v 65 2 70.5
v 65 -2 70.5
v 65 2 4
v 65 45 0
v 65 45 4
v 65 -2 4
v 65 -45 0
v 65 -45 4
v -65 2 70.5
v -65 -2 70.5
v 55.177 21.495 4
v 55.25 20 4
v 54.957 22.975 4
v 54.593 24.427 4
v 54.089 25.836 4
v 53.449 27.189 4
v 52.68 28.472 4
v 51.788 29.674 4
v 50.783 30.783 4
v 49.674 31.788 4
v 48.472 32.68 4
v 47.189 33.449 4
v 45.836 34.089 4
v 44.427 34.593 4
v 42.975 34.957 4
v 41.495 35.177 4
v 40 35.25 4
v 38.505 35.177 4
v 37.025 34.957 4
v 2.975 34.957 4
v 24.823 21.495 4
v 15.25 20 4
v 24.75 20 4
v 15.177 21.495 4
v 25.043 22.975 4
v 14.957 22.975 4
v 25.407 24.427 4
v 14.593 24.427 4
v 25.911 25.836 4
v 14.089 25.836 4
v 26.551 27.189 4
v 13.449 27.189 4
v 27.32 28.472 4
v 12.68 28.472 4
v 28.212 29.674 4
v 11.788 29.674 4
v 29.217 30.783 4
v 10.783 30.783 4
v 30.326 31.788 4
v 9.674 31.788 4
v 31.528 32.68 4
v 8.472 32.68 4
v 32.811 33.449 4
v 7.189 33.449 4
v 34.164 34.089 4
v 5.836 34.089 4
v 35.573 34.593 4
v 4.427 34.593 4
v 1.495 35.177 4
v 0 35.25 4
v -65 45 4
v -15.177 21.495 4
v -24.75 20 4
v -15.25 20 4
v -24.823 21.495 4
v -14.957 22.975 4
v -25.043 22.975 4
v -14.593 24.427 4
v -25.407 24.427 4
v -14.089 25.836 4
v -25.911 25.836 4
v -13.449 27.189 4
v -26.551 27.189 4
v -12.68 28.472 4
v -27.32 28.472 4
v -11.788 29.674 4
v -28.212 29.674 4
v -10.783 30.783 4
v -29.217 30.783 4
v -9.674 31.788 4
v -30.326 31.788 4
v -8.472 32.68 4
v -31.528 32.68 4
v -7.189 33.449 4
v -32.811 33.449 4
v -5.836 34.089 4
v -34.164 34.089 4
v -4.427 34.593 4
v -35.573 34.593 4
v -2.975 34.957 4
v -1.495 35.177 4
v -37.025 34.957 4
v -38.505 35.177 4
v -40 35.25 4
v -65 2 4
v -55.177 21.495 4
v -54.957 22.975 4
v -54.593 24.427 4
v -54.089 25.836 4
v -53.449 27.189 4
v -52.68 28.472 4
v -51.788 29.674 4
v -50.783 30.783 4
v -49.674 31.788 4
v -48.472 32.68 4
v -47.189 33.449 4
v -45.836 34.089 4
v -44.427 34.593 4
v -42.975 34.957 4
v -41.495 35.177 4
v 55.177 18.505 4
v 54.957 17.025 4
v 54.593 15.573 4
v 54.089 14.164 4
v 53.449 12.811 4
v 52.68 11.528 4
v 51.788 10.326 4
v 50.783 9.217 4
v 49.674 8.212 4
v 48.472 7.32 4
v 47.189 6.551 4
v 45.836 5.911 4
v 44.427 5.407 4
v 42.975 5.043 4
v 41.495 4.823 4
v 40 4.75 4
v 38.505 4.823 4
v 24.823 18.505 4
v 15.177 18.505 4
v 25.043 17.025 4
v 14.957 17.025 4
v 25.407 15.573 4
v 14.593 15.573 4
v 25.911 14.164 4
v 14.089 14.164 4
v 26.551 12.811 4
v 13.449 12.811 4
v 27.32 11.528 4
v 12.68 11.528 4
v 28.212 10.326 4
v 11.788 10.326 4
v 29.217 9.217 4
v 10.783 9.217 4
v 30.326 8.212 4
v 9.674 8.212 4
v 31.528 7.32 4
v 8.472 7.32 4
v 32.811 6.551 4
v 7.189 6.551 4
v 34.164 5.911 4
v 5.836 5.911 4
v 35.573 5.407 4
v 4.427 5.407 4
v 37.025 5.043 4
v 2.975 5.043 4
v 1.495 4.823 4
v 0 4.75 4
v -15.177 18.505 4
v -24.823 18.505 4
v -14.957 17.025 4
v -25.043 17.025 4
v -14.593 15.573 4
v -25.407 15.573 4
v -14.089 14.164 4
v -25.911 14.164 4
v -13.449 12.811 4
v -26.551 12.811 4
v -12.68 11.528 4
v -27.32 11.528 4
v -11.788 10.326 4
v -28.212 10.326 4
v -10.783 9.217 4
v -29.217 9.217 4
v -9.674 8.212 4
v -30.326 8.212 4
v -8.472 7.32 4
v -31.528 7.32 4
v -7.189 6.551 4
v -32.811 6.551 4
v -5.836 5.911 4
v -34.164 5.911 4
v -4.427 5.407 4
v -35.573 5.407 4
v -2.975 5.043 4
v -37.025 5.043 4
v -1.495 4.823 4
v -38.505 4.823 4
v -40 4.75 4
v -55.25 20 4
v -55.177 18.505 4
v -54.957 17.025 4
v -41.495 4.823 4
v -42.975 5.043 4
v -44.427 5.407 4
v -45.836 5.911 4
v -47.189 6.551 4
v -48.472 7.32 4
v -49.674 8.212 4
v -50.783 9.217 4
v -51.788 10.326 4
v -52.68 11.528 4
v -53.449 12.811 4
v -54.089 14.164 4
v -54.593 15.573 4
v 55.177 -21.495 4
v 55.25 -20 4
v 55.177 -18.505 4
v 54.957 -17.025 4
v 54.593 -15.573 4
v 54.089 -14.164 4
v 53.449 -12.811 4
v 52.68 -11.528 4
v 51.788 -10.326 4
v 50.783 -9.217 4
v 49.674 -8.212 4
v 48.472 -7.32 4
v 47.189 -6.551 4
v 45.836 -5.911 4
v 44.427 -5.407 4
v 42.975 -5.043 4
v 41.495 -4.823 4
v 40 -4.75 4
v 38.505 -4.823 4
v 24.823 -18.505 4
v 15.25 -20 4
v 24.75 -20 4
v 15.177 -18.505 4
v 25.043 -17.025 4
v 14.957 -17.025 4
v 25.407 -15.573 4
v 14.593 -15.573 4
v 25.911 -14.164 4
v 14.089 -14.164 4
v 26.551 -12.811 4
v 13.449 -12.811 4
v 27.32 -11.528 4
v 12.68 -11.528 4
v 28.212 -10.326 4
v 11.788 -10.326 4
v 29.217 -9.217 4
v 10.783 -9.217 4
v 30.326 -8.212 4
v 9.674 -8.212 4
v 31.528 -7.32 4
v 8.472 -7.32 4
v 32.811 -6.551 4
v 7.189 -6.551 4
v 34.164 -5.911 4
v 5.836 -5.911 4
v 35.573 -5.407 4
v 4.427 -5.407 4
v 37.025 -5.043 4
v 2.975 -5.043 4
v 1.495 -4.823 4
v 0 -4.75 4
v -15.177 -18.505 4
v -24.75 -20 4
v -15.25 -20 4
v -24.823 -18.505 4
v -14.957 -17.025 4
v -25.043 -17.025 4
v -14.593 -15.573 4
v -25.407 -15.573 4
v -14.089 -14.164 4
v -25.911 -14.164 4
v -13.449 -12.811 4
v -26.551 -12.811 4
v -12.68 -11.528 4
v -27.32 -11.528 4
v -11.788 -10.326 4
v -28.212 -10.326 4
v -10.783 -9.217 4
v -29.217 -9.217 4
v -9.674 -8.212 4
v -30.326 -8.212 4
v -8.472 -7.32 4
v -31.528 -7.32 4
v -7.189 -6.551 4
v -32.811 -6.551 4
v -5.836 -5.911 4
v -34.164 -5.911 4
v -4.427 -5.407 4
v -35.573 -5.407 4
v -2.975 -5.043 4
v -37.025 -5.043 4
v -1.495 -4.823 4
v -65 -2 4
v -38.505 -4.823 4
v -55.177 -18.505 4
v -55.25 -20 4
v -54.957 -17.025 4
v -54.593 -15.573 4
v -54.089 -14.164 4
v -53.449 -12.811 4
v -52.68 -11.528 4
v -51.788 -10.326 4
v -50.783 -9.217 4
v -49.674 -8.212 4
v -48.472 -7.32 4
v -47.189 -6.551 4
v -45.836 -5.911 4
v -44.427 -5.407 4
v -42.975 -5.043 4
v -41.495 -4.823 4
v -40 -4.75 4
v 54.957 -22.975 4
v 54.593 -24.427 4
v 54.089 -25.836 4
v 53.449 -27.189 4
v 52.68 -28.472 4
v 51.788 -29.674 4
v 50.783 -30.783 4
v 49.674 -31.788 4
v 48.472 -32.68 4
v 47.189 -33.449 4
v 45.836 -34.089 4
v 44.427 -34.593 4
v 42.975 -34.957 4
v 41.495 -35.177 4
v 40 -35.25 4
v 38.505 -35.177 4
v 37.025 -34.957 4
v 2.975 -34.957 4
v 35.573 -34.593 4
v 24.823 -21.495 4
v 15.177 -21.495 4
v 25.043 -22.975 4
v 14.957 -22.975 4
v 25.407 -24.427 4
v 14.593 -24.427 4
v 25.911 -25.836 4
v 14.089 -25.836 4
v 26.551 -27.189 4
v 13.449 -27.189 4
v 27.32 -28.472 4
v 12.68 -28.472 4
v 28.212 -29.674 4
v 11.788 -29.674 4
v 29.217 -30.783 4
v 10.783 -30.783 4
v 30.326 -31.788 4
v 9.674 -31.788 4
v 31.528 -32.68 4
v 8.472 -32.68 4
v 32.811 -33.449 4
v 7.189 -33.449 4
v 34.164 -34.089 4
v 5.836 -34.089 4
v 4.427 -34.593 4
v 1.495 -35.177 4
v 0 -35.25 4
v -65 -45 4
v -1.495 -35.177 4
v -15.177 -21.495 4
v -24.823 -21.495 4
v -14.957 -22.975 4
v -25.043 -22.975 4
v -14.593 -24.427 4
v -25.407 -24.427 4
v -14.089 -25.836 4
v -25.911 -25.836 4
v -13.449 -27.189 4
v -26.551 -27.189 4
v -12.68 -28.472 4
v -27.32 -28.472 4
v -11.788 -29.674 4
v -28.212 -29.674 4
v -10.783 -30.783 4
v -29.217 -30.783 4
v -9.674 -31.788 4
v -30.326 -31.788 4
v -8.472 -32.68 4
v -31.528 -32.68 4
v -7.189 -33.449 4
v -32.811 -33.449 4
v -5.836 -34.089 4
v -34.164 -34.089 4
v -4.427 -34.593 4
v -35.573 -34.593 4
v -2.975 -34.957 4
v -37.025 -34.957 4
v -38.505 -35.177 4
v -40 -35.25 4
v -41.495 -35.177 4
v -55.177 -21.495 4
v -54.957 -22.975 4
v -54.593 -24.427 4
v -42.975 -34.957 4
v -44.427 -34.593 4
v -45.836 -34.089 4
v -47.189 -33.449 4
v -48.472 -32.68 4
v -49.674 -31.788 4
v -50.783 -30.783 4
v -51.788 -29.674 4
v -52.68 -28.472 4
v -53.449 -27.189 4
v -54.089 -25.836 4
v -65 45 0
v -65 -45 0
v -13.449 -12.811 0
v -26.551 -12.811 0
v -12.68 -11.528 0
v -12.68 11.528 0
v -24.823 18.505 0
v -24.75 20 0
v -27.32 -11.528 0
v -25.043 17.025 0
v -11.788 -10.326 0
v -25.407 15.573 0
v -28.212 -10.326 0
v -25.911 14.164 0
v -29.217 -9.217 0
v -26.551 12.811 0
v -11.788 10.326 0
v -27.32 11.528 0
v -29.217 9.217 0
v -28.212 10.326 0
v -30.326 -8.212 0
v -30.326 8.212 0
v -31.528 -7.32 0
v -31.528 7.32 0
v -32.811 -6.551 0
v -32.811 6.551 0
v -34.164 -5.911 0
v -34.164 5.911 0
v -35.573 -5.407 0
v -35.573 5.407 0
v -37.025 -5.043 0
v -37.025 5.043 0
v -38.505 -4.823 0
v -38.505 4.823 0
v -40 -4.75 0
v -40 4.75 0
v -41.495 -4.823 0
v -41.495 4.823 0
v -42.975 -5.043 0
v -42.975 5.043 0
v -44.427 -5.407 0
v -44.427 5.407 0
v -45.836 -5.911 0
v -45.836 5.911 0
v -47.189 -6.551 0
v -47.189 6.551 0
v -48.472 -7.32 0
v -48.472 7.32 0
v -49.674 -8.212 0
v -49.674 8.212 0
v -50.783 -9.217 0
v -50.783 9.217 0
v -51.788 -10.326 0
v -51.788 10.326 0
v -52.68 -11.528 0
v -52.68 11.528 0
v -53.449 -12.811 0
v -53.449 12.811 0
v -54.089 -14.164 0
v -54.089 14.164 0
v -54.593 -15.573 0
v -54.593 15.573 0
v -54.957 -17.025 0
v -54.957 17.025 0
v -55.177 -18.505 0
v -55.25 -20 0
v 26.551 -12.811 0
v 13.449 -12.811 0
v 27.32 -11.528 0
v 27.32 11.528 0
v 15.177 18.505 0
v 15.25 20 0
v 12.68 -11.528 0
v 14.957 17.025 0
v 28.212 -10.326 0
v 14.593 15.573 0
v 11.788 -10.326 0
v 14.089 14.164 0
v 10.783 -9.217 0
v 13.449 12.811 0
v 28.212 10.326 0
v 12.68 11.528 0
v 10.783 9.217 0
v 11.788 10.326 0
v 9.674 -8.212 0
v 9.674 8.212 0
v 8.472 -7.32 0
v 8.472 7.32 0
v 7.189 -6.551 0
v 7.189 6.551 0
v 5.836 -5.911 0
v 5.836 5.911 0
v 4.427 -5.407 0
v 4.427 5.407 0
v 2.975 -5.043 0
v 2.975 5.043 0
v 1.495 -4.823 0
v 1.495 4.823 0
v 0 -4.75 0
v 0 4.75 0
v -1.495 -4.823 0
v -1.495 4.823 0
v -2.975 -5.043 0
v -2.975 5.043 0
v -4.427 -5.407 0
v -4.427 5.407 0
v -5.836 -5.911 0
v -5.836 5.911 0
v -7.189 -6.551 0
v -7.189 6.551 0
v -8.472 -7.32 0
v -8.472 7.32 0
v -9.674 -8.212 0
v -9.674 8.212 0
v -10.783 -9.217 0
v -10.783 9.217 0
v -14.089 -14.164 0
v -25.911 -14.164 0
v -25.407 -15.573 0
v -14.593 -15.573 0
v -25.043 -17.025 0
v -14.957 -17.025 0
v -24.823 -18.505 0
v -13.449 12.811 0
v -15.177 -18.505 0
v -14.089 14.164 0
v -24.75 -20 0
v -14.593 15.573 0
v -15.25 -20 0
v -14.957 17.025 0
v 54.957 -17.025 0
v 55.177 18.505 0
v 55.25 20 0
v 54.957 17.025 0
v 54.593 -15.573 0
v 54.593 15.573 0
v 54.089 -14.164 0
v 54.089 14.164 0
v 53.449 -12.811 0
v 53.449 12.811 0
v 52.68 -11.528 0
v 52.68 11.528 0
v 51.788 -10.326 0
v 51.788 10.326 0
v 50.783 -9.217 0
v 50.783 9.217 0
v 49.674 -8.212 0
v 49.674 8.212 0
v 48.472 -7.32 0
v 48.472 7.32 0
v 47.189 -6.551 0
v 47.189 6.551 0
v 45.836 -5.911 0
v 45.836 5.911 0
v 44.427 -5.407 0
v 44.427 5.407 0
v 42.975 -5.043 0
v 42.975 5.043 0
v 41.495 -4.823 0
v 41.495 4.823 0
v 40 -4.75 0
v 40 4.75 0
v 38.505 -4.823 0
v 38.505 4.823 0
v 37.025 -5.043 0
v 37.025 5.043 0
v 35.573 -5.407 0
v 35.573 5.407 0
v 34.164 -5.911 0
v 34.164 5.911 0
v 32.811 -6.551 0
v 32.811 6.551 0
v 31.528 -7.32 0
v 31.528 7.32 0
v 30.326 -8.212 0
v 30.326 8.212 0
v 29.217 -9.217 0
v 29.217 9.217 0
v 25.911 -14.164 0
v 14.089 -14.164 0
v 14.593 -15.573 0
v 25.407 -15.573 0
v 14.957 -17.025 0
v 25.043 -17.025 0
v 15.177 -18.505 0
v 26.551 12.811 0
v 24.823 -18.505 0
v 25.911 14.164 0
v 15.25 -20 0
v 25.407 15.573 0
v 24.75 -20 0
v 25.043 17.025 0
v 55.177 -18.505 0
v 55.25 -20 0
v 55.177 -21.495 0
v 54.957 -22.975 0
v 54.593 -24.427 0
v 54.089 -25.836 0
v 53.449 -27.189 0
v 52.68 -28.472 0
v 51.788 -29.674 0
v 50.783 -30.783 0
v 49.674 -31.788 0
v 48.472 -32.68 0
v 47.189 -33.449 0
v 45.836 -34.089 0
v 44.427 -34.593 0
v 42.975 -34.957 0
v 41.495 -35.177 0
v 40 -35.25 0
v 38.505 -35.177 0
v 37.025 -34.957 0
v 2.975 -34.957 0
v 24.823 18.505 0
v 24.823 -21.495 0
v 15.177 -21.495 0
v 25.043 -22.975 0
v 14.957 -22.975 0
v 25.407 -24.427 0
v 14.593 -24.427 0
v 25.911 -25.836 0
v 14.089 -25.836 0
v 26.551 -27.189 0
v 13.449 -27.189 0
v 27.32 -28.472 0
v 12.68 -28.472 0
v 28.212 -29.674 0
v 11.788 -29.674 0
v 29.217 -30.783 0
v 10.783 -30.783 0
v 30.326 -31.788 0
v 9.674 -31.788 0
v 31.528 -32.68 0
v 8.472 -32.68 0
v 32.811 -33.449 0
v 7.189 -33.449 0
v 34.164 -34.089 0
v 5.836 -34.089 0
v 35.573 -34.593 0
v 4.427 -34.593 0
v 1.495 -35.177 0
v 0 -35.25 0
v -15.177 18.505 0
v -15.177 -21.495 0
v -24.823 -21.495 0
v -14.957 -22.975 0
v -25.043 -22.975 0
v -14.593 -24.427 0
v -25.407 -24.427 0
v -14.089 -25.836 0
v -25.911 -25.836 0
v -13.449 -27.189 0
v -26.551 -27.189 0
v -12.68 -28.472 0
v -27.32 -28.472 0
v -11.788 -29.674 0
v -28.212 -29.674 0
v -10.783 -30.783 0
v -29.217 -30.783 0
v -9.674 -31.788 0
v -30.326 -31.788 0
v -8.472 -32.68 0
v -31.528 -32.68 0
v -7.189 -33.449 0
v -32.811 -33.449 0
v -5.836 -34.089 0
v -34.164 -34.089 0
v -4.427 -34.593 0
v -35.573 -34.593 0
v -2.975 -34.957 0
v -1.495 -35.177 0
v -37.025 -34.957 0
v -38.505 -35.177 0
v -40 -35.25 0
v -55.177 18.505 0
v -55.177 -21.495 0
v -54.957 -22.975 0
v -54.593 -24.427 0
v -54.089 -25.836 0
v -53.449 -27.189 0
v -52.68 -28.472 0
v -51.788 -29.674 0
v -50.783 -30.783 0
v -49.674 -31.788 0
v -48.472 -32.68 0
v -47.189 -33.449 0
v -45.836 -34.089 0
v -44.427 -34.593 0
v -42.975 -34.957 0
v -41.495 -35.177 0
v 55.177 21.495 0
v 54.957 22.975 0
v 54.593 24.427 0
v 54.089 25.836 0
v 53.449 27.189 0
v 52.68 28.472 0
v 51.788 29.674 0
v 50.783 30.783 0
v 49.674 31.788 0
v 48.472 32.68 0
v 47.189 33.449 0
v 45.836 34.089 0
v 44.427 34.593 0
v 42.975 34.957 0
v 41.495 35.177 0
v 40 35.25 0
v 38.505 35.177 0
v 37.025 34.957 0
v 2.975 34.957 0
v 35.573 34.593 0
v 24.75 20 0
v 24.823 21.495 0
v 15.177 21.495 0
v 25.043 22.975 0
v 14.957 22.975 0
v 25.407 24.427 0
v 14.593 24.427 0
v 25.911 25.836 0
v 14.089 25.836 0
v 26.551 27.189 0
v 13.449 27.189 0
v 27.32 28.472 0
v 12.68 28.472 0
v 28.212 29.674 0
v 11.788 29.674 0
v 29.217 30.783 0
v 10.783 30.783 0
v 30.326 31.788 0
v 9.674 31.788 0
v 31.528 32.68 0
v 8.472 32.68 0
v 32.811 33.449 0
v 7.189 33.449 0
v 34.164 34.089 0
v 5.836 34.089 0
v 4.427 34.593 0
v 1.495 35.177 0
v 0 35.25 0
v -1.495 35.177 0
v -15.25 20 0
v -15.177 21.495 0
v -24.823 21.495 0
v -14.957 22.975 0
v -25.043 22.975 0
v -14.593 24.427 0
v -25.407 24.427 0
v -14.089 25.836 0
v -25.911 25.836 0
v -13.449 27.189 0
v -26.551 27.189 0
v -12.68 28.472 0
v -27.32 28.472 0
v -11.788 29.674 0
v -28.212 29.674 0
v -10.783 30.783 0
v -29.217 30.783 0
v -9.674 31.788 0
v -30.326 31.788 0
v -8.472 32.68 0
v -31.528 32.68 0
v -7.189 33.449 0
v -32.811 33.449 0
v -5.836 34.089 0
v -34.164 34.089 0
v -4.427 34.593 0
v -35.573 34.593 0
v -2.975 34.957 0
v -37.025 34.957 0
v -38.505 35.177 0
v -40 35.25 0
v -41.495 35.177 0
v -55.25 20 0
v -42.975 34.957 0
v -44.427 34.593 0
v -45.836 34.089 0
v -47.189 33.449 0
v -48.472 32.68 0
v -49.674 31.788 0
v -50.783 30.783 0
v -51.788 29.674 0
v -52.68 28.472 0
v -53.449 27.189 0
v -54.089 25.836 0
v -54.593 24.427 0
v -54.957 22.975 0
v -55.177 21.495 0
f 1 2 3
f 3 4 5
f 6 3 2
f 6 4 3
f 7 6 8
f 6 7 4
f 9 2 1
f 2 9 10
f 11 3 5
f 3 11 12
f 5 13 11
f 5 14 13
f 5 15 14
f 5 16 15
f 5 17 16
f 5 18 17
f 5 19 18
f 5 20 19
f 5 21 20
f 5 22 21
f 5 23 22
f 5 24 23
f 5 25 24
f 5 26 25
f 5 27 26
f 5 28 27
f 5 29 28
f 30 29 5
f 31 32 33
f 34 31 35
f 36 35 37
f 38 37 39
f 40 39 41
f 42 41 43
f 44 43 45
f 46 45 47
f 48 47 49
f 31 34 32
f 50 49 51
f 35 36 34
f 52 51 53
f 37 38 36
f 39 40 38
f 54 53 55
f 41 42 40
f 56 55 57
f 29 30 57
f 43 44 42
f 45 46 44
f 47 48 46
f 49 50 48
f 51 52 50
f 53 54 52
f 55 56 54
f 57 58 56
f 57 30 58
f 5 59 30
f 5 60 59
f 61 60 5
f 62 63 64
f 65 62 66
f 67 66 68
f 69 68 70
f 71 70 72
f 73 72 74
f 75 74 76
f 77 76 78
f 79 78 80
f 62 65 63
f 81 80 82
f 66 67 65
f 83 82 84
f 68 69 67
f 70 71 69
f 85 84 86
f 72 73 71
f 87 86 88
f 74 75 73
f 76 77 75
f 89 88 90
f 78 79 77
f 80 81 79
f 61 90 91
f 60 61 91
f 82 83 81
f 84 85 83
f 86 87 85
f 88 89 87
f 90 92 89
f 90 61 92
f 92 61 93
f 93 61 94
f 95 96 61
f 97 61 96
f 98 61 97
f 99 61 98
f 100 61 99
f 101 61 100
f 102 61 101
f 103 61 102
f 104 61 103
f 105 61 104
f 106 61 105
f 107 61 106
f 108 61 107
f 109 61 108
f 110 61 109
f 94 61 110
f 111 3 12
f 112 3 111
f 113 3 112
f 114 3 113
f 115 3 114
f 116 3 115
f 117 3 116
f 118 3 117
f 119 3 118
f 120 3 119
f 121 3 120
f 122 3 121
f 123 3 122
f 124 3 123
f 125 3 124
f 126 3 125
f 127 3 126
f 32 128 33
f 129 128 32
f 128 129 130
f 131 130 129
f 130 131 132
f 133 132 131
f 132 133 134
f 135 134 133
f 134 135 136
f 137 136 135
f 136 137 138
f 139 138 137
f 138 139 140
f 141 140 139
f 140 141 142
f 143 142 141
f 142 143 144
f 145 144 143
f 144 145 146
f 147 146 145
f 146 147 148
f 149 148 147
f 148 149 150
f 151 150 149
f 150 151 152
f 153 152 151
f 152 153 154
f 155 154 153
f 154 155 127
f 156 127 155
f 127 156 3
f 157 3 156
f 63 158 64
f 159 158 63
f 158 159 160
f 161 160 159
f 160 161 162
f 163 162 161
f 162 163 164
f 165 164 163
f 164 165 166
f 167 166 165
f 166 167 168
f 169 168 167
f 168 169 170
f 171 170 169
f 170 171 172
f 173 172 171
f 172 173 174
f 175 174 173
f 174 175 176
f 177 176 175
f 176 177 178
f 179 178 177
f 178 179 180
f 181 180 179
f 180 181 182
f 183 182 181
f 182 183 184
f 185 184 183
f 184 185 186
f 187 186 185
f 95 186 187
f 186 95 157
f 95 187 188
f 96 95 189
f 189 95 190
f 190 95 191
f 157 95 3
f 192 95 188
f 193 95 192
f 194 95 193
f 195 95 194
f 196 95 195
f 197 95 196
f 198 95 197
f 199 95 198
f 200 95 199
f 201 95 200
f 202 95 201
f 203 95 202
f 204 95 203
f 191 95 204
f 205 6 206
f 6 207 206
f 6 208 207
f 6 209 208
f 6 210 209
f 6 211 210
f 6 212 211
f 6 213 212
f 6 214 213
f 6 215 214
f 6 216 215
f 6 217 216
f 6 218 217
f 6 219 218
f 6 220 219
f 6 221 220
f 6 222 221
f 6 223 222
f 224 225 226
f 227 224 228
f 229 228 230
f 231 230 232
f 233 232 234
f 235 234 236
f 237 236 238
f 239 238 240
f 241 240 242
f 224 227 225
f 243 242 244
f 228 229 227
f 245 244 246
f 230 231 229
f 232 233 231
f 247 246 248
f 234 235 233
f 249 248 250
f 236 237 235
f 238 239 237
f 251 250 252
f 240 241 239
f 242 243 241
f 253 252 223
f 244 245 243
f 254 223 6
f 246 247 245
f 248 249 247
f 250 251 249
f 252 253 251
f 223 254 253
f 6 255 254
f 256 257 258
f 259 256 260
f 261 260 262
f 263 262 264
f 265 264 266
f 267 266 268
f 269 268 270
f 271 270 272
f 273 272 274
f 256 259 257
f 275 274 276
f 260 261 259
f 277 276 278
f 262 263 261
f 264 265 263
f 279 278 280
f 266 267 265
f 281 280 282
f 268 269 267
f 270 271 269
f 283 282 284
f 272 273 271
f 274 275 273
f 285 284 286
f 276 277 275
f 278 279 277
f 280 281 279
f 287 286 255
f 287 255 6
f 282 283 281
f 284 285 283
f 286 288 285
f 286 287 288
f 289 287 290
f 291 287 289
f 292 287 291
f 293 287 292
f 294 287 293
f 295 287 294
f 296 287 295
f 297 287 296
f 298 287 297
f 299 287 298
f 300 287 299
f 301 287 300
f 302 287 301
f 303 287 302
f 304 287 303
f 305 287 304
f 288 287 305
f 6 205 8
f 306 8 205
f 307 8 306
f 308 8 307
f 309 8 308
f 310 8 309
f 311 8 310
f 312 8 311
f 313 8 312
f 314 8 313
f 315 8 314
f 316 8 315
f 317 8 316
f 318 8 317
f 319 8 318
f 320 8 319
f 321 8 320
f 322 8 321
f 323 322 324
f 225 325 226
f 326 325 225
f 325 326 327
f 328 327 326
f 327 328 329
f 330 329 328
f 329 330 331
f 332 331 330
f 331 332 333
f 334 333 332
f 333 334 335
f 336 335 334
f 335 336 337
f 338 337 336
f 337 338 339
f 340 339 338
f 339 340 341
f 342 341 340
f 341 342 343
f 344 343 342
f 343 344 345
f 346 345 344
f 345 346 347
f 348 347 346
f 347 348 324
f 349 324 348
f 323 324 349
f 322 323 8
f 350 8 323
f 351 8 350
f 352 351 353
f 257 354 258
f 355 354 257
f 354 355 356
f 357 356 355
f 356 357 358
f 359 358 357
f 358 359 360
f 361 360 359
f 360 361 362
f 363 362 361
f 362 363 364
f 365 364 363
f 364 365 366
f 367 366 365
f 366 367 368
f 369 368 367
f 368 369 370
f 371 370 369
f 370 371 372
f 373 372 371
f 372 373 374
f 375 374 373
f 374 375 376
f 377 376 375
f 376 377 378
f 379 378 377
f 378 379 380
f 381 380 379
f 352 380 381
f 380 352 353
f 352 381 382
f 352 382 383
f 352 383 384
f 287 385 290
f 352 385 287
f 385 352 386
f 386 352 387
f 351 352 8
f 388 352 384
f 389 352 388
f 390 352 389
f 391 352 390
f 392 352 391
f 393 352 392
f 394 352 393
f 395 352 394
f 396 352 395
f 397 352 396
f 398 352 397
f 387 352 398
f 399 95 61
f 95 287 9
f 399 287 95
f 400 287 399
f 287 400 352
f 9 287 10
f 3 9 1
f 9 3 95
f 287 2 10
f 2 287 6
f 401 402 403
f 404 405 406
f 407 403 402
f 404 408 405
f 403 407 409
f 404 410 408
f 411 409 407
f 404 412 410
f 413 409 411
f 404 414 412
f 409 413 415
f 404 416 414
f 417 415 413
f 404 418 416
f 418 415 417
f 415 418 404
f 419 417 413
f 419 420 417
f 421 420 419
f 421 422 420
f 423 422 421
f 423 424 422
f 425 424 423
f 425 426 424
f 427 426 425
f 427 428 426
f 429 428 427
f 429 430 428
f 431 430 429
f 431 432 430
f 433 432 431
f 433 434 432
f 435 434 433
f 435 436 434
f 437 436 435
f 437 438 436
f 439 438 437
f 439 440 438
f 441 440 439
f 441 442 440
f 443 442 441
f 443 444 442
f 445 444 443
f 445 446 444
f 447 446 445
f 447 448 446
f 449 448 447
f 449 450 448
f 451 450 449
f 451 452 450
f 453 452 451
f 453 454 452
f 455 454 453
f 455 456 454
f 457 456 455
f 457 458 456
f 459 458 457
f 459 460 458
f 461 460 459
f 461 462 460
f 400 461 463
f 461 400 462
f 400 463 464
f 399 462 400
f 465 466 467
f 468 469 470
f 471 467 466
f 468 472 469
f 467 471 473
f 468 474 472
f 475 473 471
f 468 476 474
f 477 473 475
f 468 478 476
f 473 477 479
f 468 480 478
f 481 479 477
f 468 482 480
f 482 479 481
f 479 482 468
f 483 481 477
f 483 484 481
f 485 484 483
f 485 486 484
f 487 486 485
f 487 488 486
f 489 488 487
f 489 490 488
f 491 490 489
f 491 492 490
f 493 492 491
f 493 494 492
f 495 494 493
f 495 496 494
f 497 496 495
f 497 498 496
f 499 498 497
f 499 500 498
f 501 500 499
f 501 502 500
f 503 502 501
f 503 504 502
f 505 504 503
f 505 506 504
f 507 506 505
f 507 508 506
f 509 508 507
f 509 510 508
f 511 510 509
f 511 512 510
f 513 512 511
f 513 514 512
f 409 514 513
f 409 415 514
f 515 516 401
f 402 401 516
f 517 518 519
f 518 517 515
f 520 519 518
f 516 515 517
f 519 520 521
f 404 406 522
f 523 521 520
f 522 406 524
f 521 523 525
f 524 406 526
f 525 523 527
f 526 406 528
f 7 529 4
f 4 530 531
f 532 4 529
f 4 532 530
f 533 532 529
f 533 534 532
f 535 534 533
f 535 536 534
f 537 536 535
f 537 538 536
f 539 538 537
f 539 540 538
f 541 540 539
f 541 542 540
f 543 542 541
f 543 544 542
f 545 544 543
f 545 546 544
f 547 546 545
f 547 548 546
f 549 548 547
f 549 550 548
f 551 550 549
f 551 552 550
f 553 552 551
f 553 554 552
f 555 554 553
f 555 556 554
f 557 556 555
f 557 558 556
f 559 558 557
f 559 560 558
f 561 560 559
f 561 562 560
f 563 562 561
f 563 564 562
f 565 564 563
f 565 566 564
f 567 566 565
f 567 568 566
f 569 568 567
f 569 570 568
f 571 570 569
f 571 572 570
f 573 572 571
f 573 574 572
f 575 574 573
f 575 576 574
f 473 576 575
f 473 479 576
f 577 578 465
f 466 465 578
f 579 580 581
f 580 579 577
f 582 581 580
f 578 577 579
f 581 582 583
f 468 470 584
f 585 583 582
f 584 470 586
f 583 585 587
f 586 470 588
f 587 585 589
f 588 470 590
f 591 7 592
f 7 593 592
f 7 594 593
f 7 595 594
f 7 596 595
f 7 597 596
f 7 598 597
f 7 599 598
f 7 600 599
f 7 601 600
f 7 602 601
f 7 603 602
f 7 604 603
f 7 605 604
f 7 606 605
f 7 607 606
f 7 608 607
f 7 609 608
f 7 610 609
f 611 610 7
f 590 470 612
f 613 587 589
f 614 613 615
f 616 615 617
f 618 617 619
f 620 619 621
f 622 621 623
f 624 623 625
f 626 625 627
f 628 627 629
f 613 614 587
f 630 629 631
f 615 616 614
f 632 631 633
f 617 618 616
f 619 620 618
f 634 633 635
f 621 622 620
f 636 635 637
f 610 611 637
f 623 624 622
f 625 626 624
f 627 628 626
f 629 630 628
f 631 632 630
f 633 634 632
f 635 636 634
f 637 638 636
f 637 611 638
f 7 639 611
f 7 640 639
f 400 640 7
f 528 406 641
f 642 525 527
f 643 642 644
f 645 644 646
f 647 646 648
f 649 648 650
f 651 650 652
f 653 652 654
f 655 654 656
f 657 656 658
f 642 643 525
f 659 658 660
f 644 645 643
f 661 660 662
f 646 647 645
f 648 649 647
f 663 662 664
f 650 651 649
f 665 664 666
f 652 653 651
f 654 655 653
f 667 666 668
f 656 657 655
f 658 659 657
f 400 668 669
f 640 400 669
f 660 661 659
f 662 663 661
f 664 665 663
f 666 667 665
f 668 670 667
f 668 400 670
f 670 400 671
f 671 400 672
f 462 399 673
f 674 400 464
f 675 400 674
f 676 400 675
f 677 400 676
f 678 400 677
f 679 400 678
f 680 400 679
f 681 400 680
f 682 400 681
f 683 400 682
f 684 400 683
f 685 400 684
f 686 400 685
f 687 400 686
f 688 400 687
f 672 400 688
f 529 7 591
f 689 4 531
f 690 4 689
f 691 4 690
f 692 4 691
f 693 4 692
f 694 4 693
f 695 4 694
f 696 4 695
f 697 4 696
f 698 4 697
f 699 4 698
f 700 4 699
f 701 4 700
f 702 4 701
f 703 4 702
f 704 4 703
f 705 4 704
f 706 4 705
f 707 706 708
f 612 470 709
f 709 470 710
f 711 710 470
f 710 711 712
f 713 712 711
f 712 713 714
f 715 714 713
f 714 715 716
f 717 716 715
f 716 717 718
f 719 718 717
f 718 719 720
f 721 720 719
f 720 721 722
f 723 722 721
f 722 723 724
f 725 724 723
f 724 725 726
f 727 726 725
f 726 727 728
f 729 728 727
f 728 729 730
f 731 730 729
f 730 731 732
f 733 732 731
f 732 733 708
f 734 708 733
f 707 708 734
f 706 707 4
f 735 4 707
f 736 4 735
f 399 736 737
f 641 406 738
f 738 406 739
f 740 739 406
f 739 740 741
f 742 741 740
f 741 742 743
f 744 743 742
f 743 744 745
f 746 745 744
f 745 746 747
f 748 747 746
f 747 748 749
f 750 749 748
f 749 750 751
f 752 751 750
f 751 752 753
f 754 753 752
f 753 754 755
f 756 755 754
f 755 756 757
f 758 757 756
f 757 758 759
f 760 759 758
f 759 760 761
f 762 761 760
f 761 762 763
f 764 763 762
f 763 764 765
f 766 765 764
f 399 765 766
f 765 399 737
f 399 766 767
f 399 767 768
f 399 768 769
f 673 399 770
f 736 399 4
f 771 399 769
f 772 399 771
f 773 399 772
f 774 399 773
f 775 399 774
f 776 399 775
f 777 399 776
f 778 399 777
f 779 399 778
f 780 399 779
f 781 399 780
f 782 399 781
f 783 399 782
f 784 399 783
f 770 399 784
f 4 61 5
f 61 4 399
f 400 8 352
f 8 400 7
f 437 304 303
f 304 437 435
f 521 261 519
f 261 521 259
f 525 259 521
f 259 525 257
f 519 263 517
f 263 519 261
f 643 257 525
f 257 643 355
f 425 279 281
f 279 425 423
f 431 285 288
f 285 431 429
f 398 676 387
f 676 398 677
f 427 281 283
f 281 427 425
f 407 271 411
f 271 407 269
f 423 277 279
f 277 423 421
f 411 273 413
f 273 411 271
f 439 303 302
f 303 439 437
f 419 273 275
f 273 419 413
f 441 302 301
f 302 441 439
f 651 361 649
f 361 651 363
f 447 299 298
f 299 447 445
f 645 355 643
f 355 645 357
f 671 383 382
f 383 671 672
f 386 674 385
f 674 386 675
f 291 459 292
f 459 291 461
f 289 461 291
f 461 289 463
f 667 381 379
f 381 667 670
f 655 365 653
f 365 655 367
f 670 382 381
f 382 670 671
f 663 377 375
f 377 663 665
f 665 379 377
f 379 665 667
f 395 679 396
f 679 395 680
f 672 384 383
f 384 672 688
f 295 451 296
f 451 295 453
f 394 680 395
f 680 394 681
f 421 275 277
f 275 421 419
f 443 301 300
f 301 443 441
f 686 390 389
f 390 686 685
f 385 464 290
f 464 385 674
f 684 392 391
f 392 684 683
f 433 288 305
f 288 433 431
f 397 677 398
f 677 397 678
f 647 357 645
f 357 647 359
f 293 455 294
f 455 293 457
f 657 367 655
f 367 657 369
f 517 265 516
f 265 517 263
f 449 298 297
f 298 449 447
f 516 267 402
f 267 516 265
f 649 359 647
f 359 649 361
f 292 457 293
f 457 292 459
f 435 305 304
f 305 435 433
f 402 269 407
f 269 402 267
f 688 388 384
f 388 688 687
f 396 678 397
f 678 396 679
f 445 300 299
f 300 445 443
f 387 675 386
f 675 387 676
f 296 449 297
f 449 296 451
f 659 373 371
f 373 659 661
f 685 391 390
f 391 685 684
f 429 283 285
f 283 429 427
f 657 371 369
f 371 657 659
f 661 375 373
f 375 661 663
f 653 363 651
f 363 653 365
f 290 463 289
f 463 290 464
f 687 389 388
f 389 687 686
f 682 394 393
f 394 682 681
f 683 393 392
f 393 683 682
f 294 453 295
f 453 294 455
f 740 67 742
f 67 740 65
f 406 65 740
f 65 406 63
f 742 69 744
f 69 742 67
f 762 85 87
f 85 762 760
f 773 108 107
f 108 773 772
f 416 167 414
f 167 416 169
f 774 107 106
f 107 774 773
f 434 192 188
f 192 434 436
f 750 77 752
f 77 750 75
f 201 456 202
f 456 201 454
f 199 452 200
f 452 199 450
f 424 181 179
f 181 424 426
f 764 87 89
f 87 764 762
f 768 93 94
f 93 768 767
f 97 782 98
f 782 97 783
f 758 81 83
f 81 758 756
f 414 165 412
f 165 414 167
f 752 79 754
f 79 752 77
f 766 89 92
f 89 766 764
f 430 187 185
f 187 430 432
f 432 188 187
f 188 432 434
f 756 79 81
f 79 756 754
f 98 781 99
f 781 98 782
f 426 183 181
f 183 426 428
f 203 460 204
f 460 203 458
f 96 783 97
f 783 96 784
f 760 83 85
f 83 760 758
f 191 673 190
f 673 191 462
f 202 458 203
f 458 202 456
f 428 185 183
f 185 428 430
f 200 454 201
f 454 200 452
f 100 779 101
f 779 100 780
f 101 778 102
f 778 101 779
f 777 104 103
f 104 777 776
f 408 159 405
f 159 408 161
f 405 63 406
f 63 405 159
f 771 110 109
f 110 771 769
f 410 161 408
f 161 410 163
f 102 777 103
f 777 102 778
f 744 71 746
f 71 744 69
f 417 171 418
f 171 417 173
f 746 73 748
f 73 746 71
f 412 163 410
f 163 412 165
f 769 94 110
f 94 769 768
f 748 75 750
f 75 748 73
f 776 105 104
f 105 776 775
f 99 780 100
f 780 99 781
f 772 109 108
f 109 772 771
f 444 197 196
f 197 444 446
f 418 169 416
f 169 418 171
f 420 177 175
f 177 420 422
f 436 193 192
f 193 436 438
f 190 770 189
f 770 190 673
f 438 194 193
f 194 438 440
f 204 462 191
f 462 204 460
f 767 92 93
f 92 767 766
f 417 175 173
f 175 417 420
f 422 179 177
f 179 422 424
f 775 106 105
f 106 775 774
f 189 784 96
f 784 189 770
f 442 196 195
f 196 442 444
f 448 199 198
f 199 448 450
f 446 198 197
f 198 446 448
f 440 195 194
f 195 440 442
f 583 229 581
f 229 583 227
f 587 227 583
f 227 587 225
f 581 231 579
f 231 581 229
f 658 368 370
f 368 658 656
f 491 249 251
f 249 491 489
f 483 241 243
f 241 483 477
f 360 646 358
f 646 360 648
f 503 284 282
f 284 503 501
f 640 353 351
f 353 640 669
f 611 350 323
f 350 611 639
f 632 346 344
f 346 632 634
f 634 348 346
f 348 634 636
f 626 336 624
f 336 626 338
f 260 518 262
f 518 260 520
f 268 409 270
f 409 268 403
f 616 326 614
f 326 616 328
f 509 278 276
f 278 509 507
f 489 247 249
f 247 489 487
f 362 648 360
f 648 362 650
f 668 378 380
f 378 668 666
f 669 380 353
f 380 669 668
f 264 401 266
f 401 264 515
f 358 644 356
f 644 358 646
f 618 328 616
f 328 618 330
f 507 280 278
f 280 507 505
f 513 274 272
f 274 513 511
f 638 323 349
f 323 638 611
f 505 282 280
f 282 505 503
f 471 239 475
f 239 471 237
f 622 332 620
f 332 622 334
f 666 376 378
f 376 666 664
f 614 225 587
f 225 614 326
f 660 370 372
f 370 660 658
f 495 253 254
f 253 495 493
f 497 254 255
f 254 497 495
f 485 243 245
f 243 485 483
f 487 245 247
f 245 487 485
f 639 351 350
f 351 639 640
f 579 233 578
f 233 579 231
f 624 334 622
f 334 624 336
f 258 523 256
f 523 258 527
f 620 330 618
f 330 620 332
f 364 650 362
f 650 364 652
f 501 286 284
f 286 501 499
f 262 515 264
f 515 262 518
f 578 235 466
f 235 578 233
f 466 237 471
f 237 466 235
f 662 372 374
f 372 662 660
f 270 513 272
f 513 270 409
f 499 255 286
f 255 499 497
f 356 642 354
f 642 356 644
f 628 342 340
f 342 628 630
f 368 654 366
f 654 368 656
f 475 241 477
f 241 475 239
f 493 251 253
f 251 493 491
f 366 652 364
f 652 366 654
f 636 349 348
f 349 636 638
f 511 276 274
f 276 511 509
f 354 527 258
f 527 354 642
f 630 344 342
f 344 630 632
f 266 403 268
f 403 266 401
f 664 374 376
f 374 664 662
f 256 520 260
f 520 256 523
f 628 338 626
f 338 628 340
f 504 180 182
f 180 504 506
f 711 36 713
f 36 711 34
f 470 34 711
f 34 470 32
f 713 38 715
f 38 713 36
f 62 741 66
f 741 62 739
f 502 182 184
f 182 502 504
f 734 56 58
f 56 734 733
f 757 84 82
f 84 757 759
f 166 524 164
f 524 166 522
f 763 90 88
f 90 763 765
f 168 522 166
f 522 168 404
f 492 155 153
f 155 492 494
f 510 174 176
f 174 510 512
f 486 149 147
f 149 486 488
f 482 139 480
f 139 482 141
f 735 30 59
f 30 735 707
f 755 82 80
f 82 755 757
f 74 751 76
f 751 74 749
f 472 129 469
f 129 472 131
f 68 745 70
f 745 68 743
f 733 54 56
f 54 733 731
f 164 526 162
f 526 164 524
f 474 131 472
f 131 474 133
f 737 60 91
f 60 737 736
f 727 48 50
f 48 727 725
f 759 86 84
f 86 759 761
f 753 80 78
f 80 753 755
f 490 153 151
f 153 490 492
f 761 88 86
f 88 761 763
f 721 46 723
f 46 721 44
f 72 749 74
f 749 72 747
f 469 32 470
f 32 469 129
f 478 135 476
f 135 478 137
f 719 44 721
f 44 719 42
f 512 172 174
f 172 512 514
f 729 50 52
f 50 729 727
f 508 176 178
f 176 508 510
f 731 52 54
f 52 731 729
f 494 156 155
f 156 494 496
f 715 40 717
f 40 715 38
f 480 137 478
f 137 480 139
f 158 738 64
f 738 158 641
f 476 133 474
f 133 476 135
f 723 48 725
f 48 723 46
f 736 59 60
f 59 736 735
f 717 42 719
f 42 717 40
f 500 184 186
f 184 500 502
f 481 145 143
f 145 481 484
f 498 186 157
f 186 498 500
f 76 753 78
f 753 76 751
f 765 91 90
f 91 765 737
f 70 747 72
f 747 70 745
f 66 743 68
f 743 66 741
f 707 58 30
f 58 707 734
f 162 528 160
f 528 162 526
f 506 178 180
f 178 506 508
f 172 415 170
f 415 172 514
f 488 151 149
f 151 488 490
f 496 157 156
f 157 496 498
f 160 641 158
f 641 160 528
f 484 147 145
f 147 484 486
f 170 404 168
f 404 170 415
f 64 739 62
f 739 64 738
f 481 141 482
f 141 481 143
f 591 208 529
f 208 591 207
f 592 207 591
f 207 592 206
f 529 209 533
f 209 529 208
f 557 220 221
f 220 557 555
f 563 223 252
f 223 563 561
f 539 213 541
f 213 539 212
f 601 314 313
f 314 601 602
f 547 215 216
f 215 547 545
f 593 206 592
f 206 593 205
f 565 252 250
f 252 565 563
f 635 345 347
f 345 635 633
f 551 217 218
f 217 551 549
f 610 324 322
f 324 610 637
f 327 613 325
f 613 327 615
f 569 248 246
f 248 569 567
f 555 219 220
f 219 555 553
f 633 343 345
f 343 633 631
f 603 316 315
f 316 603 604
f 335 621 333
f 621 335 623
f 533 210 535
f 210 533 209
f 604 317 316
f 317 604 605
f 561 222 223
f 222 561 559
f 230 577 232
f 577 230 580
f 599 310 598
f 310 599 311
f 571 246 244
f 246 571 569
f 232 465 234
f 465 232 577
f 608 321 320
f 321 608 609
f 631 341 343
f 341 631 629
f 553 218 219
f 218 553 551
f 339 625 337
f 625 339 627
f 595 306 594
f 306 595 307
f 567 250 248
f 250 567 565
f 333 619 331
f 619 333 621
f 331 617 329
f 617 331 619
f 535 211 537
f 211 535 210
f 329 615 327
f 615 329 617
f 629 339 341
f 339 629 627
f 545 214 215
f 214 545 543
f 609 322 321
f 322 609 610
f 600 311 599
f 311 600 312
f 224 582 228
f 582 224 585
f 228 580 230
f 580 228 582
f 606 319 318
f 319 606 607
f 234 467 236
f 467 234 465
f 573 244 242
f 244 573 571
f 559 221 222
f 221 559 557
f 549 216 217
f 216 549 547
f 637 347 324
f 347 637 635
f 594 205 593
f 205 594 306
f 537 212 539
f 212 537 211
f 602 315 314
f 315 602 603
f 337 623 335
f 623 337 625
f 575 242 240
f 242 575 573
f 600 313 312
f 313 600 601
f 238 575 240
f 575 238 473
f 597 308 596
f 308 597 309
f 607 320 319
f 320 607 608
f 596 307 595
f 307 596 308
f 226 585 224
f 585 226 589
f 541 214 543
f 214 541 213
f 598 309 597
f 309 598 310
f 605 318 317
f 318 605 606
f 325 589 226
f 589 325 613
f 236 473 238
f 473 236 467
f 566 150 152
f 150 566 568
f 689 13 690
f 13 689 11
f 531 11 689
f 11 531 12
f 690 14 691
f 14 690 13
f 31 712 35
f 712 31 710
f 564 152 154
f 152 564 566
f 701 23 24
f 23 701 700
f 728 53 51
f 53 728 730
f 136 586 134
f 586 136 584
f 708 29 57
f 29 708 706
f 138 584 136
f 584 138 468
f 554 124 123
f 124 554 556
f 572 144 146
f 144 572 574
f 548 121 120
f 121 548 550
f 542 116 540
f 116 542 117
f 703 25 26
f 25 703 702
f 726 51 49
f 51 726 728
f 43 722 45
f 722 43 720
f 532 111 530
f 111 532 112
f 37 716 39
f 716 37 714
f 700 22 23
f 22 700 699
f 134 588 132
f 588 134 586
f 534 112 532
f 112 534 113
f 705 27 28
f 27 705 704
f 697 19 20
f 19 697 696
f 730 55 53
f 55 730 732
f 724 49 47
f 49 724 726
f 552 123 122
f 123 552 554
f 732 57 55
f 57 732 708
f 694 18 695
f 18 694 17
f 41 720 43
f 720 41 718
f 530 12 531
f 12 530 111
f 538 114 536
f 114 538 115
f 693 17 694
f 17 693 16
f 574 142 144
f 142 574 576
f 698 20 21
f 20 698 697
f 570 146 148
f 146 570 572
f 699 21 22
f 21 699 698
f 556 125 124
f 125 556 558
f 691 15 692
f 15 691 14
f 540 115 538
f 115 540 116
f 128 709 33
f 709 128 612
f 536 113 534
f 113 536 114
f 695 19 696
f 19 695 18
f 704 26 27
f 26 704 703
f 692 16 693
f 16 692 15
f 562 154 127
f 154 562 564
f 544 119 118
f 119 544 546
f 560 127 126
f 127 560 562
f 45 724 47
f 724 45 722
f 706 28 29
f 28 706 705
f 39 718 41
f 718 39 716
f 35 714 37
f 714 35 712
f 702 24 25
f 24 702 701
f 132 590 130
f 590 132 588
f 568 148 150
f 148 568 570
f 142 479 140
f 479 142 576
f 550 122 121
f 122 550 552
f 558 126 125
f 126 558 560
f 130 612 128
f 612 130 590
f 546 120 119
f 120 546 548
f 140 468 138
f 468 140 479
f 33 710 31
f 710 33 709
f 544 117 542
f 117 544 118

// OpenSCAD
// Rack for six 50 mL conical (Falcon-type) tubes
// Print upside down, flip over after printing.
// Units: mm

$fn = 64;

// Plate
plate_x = 130;      // plate length (X)
plate_y = 90;       // plate width (Y)
plate_t = 4;        // plate thickness (Z)

// Holes
hole_d = 30.5;      // hole diameter
hole_nx = 3;        // holes along X
hole_ny = 2;        // holes along Y
hole_pitch = 40;    // centre-to-centre spacing (both directions)

// Walls
wall_len = 130;     // wall length along X
wall_th = 4;        // wall thickness along Y
wall_h = 70;        // wall top height (Z)

// Cutting overlap
eps = 0.5;          // extension past cut faces

difference() {
    union() {
        // Base plate
        translate([-plate_x/2, -plate_y/2, 0])
            cube([plate_x, plate_y, plate_t]);

        // Two solid walls along long edges
        for (s = [-1, 1])
            translate([s > 0 ? plate_x/2 - wall_len : -plate_x/2,
                       -wall_th/2, plate_t])
                cube([wall_len, wall_th, wall_h - plate_t + eps]);
    }

    // Through-holes
    for (i = [0 : hole_nx - 1])
        for (j = [0 : hole_ny - 1])
            translate([(i - (hole_nx - 1)/2) * hole_pitch,
                       (j - (hole_ny - 1)/2) * hole_pitch,
                       -eps])
                cylinder(d = hole_d, h = plate_t + 2*eps);
}
